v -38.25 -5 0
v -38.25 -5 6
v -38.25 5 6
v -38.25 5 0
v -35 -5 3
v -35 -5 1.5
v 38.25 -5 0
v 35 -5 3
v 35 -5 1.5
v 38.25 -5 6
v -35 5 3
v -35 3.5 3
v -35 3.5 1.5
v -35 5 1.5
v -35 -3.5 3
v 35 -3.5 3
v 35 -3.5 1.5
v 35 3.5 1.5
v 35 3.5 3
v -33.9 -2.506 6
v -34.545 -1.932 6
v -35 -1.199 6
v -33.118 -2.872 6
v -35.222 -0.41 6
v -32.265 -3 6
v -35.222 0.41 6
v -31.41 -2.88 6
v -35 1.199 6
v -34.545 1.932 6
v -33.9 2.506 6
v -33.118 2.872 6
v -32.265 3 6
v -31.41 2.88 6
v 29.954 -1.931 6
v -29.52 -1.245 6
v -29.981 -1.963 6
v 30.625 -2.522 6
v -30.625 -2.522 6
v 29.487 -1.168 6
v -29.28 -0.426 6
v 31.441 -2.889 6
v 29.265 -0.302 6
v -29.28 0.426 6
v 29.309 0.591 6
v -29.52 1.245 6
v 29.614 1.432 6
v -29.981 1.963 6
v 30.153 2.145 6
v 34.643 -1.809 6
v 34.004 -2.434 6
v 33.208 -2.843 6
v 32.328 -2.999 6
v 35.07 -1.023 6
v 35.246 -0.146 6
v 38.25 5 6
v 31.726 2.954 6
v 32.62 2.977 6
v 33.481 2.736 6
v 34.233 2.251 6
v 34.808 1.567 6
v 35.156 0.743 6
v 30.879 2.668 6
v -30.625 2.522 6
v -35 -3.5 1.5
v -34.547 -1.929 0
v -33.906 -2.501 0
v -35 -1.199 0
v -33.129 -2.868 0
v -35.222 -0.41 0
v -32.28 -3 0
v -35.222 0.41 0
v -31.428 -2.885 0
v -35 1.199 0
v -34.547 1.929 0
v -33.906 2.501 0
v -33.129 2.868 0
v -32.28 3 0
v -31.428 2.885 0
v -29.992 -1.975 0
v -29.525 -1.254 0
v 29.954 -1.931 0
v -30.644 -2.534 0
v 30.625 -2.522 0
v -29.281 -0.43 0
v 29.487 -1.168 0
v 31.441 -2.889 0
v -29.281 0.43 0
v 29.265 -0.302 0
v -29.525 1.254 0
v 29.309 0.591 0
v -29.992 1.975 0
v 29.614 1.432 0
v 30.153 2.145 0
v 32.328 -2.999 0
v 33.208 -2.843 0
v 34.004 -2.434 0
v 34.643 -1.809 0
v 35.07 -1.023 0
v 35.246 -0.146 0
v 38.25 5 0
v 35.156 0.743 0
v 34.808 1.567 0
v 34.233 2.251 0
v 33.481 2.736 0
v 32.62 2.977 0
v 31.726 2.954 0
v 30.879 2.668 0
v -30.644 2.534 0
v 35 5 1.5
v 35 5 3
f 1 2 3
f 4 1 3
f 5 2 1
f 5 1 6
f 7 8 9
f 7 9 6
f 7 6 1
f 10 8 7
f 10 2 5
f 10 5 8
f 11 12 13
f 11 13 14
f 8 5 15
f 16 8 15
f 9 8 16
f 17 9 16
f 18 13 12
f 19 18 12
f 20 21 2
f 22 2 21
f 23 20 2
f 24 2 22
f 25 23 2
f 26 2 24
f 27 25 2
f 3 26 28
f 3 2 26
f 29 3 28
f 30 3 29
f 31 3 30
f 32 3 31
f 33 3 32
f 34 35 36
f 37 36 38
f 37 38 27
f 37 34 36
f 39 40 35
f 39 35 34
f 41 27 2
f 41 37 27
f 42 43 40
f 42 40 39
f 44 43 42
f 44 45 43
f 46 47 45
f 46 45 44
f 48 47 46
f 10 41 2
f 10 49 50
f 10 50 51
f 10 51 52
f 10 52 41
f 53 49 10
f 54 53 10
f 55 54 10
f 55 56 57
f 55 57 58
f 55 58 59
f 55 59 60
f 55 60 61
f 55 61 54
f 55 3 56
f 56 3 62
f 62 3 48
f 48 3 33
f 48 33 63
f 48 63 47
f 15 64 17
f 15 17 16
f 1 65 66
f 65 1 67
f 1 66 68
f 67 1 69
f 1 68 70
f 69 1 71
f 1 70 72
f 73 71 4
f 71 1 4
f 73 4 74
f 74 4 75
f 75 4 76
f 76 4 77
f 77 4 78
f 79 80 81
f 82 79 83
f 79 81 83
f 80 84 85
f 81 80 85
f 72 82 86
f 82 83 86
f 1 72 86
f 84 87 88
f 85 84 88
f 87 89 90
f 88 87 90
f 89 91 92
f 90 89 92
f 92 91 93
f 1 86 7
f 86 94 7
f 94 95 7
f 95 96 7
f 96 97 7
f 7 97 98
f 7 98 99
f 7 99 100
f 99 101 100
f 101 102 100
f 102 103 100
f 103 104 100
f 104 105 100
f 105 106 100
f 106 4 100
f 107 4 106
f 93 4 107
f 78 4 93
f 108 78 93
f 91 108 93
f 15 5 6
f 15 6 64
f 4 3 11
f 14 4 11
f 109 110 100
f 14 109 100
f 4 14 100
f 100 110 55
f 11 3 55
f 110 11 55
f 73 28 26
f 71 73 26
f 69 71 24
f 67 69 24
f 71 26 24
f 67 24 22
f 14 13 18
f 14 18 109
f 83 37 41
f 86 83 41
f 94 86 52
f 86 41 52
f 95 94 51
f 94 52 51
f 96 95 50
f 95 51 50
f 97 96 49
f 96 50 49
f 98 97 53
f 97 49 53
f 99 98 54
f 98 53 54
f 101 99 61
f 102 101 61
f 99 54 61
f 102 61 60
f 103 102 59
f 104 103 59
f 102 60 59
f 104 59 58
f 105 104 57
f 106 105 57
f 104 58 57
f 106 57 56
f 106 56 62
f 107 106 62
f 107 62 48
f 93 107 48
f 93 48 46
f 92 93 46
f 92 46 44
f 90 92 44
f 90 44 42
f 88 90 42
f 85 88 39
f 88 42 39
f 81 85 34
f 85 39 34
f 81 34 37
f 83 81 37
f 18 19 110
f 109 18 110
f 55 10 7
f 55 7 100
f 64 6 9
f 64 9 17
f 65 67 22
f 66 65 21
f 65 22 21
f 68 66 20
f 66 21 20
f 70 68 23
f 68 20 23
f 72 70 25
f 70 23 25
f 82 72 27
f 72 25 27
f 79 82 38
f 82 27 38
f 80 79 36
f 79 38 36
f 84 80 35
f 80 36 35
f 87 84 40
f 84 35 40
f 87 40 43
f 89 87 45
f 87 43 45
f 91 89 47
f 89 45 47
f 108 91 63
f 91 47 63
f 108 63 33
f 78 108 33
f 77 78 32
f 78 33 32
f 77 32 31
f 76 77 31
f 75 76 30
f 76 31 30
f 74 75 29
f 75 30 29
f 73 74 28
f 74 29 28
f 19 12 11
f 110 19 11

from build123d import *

# Parameters (mm, degrees)
SKETCH_1_W          = 70
SKETCH_1_H          = 10
EXTRUDE_1_DEPTH     = 6
SKETCH_2_W          = 1.5
SKETCH_2_H          = 1.5
CUT_EXTRUDE_1_DEPTH = 71.434366612
SKETCH_3_R          = 3
CUT_EXTRUDE_2_DEPTH = 36.860842154
SKETCH_4_R          = 3
CUT_EXTRUDE_3_DEPTH = 36.860842154
SKETCH_5_W          = 3.25
SKETCH_5_H          = 10
EXTRUDE_2_DEPTH     = 6
SKETCH_9_R          = 3
CUT_EXTRUDE_4_DEPTH = 40.039243077
SKETCH_10_R         = 3
EXTRUDE_4_DEPTH     = 6
SKETCH_11_R         = 3
CUT_EXTRUDE_5_DEPTH = 40.039243077


with BuildPart() as part:
    # 草图1 → 凸台-拉伸1 (new body)
    with BuildSketch(Plane.XY):
        Rectangle(SKETCH_1_W, SKETCH_1_H)
    extrude(amount=EXTRUDE_1_DEPTH)

    # 草图2 → 切除-拉伸1 (cut, through all)
    with BuildSketch(Plane.ZY.offset(35)):
        with Locations((2.25, 4.25)):
            Rectangle(SKETCH_2_W, SKETCH_2_H)
        with Locations((2.25, -4.25)):
            Rectangle(SKETCH_2_W, SKETCH_2_H)
    extrude(amount=-CUT_EXTRUDE_1_DEPTH, mode=Mode.SUBTRACT)

    # 草图3 → 切除-拉伸2 (cut, through all)
    with BuildSketch(Plane.XY.offset(6)):
        with Locations((-29, 0)):
            Circle(SKETCH_3_R)
        with Locations((29, 0)):
            Circle(SKETCH_3_R)
    extrude(amount=-CUT_EXTRUDE_2_DEPTH, mode=Mode.SUBTRACT)

    # 草图4 → 切除-拉伸3 (cut, through all)
    with BuildSketch(Plane.XY.offset(6)):
        with Locations((-32.25, 0)):
            Circle(SKETCH_4_R)
    extrude(amount=-CUT_EXTRUDE_3_DEPTH, mode=Mode.SUBTRACT)

    # 草图5 → 凸台-拉伸2 (add)
    with BuildSketch(Plane.XY.offset(6)):
        with Locations((36.625, 0)):
            Rectangle(SKETCH_5_W, SKETCH_5_H)
        with Locations((-36.625, 0)):
            Rectangle(SKETCH_5_W, SKETCH_5_H)
    extrude(amount=-EXTRUDE_2_DEPTH)

    # 草图9 → 切除-拉伸4 (cut, through all)
    with BuildSketch(Plane.XY.offset(6)):
        with BuildLine():
            ThreePointArc((-30.625, -2.521780125), (-32, 0), (-30.625, 2.521780125))
            ThreePointArc((-30.625, 2.521780125), (-33.118257406, 2.871607403), (-35, 1.198957881))
            Line((-35, 1.198957881), (-35, -1.198957881))
            ThreePointArc((-35, -1.198957881), (-33.118257406, -2.871607403), (-30.625, -2.521780125))
        make_face()
        with BuildLine():
            Line((-35, -1.198957881), (-35, 1.198957881))
            ThreePointArc((-35, 1.198957881), (-35.25, 0), (-35, -1.198957881))
        make_face()
        with Locations((-29, 0)):
            Circle(SKETCH_9_R)
        with Locations((-32.25, 0)):
            Circle(SKETCH_9_R)
        with Locations((32.25, 0)):
            Circle(SKETCH_9_R)
        with Locations((29, 0)):
            Circle(SKETCH_9_R)
    extrude(amount=-CUT_EXTRUDE_4_DEPTH, mode=Mode.SUBTRACT)

    # 草图10 → 凸台-拉伸4 (add)
    with BuildSketch(Plane.XY.offset(6)):
        with Locations((-29, 0)):
            Circle(SKETCH_10_R)
        with Locations((29, 0)):
            Circle(SKETCH_10_R)
    extrude(amount=-EXTRUDE_4_DEPTH)

    # 草图11 → 切除-拉伸5 (cut, through all)
    with BuildSketch(Plane.XY.offset(6)):
        with Locations((-32.25, 0)):
            Circle(SKETCH_11_R)
        with Locations((32.25, 0)):
            Circle(SKETCH_11_R)
    extrude(amount=-CUT_EXTRUDE_5_DEPTH, mode=Mode.SUBTRACT)


solid = part.part
